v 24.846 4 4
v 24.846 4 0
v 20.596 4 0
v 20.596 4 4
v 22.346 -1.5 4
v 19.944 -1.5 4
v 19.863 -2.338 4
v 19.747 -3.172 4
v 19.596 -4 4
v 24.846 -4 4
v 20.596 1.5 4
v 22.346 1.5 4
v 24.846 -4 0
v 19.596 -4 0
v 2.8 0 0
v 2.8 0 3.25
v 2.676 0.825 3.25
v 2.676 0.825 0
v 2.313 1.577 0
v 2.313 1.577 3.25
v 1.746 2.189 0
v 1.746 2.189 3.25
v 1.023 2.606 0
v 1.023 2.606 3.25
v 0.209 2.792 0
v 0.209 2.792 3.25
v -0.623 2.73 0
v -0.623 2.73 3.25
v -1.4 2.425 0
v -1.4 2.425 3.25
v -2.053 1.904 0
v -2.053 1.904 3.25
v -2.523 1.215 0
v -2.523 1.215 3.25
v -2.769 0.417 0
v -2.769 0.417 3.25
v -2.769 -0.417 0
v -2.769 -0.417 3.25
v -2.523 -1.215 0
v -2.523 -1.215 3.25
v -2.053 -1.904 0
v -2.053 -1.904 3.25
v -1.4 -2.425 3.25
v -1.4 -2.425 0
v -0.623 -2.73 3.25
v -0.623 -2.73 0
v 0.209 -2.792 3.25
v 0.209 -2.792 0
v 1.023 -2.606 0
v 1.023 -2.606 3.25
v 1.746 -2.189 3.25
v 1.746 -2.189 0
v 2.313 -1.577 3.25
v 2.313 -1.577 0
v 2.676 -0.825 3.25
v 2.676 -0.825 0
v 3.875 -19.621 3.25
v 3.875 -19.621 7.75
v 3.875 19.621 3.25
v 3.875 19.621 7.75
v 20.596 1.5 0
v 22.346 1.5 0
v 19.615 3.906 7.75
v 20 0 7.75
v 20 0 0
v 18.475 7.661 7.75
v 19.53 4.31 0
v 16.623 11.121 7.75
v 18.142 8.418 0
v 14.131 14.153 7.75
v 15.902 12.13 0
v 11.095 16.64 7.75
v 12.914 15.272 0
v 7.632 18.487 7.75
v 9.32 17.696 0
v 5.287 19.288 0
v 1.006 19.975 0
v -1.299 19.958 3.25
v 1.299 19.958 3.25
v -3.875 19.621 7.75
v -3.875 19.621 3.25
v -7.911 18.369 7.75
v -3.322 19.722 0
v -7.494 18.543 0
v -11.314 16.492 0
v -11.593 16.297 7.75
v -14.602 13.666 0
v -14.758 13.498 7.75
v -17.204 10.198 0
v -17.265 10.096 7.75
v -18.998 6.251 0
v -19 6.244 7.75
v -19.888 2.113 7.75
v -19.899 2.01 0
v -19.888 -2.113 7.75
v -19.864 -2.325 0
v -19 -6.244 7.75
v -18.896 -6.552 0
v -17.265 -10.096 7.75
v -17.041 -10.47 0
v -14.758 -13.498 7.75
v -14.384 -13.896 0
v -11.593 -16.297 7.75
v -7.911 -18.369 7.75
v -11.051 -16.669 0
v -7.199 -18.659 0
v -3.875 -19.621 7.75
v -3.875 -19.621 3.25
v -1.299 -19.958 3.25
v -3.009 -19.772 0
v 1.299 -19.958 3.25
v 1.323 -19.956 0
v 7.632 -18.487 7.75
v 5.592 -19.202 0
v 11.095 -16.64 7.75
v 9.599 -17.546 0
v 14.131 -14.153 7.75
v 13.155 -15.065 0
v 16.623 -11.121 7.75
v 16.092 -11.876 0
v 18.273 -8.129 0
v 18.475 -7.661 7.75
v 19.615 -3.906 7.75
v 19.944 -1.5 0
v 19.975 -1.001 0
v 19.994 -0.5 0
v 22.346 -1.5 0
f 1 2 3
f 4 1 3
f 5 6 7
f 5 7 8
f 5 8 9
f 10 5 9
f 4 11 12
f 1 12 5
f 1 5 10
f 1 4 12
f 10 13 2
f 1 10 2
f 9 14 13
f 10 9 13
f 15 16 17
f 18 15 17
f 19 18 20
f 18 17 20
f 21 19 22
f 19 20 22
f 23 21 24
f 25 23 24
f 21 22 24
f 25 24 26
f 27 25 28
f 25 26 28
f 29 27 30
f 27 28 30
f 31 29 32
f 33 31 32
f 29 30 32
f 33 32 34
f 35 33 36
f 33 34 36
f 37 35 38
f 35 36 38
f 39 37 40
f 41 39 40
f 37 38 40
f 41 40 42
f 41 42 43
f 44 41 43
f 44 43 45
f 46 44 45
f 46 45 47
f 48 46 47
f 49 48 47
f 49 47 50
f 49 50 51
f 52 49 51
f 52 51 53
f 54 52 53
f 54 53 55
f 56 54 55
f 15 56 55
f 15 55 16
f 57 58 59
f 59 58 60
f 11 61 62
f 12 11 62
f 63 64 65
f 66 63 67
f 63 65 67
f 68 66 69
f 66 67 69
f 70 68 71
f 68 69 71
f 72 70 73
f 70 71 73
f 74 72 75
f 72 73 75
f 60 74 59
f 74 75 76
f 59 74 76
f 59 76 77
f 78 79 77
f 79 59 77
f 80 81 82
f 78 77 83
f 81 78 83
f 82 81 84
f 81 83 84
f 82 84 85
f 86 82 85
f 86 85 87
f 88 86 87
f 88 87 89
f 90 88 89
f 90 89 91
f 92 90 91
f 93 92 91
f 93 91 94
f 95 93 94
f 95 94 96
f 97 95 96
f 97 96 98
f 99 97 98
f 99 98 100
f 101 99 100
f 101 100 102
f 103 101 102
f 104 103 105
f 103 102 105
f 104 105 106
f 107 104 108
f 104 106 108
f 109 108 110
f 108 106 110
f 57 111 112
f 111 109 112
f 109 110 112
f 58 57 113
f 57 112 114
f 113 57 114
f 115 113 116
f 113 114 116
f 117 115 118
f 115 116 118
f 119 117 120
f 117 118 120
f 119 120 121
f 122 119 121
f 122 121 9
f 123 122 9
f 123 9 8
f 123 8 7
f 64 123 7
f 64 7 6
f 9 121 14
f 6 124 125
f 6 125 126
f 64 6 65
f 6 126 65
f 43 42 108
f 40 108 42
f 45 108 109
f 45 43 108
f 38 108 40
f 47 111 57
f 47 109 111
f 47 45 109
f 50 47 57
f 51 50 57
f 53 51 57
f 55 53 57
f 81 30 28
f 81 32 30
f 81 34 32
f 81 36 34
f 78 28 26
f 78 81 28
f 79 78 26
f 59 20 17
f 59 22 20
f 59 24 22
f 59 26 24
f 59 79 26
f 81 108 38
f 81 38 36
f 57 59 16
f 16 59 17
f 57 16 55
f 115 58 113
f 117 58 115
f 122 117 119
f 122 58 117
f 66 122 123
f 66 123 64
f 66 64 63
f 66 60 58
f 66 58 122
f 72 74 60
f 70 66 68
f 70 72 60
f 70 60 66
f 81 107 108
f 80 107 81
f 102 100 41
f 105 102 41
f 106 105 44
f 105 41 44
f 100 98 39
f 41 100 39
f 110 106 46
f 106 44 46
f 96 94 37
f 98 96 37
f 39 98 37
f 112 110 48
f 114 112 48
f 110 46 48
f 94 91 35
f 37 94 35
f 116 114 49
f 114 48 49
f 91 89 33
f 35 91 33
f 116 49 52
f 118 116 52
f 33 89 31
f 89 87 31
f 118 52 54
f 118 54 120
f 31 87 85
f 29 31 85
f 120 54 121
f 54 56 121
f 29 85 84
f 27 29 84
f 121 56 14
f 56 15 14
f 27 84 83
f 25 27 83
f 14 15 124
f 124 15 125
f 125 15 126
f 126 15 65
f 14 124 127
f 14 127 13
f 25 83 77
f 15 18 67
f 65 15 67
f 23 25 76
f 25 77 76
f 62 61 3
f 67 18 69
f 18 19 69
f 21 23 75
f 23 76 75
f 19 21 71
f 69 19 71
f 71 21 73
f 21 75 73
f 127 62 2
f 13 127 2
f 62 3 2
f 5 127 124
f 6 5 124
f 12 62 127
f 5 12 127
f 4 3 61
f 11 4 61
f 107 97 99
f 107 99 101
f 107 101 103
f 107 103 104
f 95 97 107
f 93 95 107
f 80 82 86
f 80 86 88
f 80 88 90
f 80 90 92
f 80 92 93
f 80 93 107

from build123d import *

# Parameters (mm, degrees)
F0_R     = 20
F1_DEPTH = 7.75
F2_W     = 7.75
F2_H     = 40
F3_DEPTH = 4.5
F5_DEPTH = 4
F6_R     = 2.8
F7_DEPTH = 3.251


with BuildPart() as f1:
    # F0 (on Top) → F1 (new body)
    with BuildSketch(Plane.XY):
        Circle(F0_R)
    extrude(amount=F1_DEPTH)

    # F2 (on face) → F3 (cut)
    with BuildSketch(Plane.XY.offset(7.75)):
        Rectangle(F2_W, F2_H)
    extrude(amount=-F3_DEPTH, mode=Mode.SUBTRACT)

    # F4 (on Top) → F5 (join)
    with BuildSketch(Plane.XY):
        Polygon((22.345918, -1.5), (18.466113, -1.5), (19.595918, -4), (24.845918, -4), (24.845918, 4), (20.595918, 4), (20.595918, 1.5), (22.345918, 1.5), align=None)
    extrude(amount=F5_DEPTH)

    # F6 (on face) → F7 (cut, through all)
    with BuildSketch(Plane.XY.offset(3.25)):
        Circle(F6_R)
    extrude(amount=-F7_DEPTH, mode=Mode.SUBTRACT)


solid = f1.part
